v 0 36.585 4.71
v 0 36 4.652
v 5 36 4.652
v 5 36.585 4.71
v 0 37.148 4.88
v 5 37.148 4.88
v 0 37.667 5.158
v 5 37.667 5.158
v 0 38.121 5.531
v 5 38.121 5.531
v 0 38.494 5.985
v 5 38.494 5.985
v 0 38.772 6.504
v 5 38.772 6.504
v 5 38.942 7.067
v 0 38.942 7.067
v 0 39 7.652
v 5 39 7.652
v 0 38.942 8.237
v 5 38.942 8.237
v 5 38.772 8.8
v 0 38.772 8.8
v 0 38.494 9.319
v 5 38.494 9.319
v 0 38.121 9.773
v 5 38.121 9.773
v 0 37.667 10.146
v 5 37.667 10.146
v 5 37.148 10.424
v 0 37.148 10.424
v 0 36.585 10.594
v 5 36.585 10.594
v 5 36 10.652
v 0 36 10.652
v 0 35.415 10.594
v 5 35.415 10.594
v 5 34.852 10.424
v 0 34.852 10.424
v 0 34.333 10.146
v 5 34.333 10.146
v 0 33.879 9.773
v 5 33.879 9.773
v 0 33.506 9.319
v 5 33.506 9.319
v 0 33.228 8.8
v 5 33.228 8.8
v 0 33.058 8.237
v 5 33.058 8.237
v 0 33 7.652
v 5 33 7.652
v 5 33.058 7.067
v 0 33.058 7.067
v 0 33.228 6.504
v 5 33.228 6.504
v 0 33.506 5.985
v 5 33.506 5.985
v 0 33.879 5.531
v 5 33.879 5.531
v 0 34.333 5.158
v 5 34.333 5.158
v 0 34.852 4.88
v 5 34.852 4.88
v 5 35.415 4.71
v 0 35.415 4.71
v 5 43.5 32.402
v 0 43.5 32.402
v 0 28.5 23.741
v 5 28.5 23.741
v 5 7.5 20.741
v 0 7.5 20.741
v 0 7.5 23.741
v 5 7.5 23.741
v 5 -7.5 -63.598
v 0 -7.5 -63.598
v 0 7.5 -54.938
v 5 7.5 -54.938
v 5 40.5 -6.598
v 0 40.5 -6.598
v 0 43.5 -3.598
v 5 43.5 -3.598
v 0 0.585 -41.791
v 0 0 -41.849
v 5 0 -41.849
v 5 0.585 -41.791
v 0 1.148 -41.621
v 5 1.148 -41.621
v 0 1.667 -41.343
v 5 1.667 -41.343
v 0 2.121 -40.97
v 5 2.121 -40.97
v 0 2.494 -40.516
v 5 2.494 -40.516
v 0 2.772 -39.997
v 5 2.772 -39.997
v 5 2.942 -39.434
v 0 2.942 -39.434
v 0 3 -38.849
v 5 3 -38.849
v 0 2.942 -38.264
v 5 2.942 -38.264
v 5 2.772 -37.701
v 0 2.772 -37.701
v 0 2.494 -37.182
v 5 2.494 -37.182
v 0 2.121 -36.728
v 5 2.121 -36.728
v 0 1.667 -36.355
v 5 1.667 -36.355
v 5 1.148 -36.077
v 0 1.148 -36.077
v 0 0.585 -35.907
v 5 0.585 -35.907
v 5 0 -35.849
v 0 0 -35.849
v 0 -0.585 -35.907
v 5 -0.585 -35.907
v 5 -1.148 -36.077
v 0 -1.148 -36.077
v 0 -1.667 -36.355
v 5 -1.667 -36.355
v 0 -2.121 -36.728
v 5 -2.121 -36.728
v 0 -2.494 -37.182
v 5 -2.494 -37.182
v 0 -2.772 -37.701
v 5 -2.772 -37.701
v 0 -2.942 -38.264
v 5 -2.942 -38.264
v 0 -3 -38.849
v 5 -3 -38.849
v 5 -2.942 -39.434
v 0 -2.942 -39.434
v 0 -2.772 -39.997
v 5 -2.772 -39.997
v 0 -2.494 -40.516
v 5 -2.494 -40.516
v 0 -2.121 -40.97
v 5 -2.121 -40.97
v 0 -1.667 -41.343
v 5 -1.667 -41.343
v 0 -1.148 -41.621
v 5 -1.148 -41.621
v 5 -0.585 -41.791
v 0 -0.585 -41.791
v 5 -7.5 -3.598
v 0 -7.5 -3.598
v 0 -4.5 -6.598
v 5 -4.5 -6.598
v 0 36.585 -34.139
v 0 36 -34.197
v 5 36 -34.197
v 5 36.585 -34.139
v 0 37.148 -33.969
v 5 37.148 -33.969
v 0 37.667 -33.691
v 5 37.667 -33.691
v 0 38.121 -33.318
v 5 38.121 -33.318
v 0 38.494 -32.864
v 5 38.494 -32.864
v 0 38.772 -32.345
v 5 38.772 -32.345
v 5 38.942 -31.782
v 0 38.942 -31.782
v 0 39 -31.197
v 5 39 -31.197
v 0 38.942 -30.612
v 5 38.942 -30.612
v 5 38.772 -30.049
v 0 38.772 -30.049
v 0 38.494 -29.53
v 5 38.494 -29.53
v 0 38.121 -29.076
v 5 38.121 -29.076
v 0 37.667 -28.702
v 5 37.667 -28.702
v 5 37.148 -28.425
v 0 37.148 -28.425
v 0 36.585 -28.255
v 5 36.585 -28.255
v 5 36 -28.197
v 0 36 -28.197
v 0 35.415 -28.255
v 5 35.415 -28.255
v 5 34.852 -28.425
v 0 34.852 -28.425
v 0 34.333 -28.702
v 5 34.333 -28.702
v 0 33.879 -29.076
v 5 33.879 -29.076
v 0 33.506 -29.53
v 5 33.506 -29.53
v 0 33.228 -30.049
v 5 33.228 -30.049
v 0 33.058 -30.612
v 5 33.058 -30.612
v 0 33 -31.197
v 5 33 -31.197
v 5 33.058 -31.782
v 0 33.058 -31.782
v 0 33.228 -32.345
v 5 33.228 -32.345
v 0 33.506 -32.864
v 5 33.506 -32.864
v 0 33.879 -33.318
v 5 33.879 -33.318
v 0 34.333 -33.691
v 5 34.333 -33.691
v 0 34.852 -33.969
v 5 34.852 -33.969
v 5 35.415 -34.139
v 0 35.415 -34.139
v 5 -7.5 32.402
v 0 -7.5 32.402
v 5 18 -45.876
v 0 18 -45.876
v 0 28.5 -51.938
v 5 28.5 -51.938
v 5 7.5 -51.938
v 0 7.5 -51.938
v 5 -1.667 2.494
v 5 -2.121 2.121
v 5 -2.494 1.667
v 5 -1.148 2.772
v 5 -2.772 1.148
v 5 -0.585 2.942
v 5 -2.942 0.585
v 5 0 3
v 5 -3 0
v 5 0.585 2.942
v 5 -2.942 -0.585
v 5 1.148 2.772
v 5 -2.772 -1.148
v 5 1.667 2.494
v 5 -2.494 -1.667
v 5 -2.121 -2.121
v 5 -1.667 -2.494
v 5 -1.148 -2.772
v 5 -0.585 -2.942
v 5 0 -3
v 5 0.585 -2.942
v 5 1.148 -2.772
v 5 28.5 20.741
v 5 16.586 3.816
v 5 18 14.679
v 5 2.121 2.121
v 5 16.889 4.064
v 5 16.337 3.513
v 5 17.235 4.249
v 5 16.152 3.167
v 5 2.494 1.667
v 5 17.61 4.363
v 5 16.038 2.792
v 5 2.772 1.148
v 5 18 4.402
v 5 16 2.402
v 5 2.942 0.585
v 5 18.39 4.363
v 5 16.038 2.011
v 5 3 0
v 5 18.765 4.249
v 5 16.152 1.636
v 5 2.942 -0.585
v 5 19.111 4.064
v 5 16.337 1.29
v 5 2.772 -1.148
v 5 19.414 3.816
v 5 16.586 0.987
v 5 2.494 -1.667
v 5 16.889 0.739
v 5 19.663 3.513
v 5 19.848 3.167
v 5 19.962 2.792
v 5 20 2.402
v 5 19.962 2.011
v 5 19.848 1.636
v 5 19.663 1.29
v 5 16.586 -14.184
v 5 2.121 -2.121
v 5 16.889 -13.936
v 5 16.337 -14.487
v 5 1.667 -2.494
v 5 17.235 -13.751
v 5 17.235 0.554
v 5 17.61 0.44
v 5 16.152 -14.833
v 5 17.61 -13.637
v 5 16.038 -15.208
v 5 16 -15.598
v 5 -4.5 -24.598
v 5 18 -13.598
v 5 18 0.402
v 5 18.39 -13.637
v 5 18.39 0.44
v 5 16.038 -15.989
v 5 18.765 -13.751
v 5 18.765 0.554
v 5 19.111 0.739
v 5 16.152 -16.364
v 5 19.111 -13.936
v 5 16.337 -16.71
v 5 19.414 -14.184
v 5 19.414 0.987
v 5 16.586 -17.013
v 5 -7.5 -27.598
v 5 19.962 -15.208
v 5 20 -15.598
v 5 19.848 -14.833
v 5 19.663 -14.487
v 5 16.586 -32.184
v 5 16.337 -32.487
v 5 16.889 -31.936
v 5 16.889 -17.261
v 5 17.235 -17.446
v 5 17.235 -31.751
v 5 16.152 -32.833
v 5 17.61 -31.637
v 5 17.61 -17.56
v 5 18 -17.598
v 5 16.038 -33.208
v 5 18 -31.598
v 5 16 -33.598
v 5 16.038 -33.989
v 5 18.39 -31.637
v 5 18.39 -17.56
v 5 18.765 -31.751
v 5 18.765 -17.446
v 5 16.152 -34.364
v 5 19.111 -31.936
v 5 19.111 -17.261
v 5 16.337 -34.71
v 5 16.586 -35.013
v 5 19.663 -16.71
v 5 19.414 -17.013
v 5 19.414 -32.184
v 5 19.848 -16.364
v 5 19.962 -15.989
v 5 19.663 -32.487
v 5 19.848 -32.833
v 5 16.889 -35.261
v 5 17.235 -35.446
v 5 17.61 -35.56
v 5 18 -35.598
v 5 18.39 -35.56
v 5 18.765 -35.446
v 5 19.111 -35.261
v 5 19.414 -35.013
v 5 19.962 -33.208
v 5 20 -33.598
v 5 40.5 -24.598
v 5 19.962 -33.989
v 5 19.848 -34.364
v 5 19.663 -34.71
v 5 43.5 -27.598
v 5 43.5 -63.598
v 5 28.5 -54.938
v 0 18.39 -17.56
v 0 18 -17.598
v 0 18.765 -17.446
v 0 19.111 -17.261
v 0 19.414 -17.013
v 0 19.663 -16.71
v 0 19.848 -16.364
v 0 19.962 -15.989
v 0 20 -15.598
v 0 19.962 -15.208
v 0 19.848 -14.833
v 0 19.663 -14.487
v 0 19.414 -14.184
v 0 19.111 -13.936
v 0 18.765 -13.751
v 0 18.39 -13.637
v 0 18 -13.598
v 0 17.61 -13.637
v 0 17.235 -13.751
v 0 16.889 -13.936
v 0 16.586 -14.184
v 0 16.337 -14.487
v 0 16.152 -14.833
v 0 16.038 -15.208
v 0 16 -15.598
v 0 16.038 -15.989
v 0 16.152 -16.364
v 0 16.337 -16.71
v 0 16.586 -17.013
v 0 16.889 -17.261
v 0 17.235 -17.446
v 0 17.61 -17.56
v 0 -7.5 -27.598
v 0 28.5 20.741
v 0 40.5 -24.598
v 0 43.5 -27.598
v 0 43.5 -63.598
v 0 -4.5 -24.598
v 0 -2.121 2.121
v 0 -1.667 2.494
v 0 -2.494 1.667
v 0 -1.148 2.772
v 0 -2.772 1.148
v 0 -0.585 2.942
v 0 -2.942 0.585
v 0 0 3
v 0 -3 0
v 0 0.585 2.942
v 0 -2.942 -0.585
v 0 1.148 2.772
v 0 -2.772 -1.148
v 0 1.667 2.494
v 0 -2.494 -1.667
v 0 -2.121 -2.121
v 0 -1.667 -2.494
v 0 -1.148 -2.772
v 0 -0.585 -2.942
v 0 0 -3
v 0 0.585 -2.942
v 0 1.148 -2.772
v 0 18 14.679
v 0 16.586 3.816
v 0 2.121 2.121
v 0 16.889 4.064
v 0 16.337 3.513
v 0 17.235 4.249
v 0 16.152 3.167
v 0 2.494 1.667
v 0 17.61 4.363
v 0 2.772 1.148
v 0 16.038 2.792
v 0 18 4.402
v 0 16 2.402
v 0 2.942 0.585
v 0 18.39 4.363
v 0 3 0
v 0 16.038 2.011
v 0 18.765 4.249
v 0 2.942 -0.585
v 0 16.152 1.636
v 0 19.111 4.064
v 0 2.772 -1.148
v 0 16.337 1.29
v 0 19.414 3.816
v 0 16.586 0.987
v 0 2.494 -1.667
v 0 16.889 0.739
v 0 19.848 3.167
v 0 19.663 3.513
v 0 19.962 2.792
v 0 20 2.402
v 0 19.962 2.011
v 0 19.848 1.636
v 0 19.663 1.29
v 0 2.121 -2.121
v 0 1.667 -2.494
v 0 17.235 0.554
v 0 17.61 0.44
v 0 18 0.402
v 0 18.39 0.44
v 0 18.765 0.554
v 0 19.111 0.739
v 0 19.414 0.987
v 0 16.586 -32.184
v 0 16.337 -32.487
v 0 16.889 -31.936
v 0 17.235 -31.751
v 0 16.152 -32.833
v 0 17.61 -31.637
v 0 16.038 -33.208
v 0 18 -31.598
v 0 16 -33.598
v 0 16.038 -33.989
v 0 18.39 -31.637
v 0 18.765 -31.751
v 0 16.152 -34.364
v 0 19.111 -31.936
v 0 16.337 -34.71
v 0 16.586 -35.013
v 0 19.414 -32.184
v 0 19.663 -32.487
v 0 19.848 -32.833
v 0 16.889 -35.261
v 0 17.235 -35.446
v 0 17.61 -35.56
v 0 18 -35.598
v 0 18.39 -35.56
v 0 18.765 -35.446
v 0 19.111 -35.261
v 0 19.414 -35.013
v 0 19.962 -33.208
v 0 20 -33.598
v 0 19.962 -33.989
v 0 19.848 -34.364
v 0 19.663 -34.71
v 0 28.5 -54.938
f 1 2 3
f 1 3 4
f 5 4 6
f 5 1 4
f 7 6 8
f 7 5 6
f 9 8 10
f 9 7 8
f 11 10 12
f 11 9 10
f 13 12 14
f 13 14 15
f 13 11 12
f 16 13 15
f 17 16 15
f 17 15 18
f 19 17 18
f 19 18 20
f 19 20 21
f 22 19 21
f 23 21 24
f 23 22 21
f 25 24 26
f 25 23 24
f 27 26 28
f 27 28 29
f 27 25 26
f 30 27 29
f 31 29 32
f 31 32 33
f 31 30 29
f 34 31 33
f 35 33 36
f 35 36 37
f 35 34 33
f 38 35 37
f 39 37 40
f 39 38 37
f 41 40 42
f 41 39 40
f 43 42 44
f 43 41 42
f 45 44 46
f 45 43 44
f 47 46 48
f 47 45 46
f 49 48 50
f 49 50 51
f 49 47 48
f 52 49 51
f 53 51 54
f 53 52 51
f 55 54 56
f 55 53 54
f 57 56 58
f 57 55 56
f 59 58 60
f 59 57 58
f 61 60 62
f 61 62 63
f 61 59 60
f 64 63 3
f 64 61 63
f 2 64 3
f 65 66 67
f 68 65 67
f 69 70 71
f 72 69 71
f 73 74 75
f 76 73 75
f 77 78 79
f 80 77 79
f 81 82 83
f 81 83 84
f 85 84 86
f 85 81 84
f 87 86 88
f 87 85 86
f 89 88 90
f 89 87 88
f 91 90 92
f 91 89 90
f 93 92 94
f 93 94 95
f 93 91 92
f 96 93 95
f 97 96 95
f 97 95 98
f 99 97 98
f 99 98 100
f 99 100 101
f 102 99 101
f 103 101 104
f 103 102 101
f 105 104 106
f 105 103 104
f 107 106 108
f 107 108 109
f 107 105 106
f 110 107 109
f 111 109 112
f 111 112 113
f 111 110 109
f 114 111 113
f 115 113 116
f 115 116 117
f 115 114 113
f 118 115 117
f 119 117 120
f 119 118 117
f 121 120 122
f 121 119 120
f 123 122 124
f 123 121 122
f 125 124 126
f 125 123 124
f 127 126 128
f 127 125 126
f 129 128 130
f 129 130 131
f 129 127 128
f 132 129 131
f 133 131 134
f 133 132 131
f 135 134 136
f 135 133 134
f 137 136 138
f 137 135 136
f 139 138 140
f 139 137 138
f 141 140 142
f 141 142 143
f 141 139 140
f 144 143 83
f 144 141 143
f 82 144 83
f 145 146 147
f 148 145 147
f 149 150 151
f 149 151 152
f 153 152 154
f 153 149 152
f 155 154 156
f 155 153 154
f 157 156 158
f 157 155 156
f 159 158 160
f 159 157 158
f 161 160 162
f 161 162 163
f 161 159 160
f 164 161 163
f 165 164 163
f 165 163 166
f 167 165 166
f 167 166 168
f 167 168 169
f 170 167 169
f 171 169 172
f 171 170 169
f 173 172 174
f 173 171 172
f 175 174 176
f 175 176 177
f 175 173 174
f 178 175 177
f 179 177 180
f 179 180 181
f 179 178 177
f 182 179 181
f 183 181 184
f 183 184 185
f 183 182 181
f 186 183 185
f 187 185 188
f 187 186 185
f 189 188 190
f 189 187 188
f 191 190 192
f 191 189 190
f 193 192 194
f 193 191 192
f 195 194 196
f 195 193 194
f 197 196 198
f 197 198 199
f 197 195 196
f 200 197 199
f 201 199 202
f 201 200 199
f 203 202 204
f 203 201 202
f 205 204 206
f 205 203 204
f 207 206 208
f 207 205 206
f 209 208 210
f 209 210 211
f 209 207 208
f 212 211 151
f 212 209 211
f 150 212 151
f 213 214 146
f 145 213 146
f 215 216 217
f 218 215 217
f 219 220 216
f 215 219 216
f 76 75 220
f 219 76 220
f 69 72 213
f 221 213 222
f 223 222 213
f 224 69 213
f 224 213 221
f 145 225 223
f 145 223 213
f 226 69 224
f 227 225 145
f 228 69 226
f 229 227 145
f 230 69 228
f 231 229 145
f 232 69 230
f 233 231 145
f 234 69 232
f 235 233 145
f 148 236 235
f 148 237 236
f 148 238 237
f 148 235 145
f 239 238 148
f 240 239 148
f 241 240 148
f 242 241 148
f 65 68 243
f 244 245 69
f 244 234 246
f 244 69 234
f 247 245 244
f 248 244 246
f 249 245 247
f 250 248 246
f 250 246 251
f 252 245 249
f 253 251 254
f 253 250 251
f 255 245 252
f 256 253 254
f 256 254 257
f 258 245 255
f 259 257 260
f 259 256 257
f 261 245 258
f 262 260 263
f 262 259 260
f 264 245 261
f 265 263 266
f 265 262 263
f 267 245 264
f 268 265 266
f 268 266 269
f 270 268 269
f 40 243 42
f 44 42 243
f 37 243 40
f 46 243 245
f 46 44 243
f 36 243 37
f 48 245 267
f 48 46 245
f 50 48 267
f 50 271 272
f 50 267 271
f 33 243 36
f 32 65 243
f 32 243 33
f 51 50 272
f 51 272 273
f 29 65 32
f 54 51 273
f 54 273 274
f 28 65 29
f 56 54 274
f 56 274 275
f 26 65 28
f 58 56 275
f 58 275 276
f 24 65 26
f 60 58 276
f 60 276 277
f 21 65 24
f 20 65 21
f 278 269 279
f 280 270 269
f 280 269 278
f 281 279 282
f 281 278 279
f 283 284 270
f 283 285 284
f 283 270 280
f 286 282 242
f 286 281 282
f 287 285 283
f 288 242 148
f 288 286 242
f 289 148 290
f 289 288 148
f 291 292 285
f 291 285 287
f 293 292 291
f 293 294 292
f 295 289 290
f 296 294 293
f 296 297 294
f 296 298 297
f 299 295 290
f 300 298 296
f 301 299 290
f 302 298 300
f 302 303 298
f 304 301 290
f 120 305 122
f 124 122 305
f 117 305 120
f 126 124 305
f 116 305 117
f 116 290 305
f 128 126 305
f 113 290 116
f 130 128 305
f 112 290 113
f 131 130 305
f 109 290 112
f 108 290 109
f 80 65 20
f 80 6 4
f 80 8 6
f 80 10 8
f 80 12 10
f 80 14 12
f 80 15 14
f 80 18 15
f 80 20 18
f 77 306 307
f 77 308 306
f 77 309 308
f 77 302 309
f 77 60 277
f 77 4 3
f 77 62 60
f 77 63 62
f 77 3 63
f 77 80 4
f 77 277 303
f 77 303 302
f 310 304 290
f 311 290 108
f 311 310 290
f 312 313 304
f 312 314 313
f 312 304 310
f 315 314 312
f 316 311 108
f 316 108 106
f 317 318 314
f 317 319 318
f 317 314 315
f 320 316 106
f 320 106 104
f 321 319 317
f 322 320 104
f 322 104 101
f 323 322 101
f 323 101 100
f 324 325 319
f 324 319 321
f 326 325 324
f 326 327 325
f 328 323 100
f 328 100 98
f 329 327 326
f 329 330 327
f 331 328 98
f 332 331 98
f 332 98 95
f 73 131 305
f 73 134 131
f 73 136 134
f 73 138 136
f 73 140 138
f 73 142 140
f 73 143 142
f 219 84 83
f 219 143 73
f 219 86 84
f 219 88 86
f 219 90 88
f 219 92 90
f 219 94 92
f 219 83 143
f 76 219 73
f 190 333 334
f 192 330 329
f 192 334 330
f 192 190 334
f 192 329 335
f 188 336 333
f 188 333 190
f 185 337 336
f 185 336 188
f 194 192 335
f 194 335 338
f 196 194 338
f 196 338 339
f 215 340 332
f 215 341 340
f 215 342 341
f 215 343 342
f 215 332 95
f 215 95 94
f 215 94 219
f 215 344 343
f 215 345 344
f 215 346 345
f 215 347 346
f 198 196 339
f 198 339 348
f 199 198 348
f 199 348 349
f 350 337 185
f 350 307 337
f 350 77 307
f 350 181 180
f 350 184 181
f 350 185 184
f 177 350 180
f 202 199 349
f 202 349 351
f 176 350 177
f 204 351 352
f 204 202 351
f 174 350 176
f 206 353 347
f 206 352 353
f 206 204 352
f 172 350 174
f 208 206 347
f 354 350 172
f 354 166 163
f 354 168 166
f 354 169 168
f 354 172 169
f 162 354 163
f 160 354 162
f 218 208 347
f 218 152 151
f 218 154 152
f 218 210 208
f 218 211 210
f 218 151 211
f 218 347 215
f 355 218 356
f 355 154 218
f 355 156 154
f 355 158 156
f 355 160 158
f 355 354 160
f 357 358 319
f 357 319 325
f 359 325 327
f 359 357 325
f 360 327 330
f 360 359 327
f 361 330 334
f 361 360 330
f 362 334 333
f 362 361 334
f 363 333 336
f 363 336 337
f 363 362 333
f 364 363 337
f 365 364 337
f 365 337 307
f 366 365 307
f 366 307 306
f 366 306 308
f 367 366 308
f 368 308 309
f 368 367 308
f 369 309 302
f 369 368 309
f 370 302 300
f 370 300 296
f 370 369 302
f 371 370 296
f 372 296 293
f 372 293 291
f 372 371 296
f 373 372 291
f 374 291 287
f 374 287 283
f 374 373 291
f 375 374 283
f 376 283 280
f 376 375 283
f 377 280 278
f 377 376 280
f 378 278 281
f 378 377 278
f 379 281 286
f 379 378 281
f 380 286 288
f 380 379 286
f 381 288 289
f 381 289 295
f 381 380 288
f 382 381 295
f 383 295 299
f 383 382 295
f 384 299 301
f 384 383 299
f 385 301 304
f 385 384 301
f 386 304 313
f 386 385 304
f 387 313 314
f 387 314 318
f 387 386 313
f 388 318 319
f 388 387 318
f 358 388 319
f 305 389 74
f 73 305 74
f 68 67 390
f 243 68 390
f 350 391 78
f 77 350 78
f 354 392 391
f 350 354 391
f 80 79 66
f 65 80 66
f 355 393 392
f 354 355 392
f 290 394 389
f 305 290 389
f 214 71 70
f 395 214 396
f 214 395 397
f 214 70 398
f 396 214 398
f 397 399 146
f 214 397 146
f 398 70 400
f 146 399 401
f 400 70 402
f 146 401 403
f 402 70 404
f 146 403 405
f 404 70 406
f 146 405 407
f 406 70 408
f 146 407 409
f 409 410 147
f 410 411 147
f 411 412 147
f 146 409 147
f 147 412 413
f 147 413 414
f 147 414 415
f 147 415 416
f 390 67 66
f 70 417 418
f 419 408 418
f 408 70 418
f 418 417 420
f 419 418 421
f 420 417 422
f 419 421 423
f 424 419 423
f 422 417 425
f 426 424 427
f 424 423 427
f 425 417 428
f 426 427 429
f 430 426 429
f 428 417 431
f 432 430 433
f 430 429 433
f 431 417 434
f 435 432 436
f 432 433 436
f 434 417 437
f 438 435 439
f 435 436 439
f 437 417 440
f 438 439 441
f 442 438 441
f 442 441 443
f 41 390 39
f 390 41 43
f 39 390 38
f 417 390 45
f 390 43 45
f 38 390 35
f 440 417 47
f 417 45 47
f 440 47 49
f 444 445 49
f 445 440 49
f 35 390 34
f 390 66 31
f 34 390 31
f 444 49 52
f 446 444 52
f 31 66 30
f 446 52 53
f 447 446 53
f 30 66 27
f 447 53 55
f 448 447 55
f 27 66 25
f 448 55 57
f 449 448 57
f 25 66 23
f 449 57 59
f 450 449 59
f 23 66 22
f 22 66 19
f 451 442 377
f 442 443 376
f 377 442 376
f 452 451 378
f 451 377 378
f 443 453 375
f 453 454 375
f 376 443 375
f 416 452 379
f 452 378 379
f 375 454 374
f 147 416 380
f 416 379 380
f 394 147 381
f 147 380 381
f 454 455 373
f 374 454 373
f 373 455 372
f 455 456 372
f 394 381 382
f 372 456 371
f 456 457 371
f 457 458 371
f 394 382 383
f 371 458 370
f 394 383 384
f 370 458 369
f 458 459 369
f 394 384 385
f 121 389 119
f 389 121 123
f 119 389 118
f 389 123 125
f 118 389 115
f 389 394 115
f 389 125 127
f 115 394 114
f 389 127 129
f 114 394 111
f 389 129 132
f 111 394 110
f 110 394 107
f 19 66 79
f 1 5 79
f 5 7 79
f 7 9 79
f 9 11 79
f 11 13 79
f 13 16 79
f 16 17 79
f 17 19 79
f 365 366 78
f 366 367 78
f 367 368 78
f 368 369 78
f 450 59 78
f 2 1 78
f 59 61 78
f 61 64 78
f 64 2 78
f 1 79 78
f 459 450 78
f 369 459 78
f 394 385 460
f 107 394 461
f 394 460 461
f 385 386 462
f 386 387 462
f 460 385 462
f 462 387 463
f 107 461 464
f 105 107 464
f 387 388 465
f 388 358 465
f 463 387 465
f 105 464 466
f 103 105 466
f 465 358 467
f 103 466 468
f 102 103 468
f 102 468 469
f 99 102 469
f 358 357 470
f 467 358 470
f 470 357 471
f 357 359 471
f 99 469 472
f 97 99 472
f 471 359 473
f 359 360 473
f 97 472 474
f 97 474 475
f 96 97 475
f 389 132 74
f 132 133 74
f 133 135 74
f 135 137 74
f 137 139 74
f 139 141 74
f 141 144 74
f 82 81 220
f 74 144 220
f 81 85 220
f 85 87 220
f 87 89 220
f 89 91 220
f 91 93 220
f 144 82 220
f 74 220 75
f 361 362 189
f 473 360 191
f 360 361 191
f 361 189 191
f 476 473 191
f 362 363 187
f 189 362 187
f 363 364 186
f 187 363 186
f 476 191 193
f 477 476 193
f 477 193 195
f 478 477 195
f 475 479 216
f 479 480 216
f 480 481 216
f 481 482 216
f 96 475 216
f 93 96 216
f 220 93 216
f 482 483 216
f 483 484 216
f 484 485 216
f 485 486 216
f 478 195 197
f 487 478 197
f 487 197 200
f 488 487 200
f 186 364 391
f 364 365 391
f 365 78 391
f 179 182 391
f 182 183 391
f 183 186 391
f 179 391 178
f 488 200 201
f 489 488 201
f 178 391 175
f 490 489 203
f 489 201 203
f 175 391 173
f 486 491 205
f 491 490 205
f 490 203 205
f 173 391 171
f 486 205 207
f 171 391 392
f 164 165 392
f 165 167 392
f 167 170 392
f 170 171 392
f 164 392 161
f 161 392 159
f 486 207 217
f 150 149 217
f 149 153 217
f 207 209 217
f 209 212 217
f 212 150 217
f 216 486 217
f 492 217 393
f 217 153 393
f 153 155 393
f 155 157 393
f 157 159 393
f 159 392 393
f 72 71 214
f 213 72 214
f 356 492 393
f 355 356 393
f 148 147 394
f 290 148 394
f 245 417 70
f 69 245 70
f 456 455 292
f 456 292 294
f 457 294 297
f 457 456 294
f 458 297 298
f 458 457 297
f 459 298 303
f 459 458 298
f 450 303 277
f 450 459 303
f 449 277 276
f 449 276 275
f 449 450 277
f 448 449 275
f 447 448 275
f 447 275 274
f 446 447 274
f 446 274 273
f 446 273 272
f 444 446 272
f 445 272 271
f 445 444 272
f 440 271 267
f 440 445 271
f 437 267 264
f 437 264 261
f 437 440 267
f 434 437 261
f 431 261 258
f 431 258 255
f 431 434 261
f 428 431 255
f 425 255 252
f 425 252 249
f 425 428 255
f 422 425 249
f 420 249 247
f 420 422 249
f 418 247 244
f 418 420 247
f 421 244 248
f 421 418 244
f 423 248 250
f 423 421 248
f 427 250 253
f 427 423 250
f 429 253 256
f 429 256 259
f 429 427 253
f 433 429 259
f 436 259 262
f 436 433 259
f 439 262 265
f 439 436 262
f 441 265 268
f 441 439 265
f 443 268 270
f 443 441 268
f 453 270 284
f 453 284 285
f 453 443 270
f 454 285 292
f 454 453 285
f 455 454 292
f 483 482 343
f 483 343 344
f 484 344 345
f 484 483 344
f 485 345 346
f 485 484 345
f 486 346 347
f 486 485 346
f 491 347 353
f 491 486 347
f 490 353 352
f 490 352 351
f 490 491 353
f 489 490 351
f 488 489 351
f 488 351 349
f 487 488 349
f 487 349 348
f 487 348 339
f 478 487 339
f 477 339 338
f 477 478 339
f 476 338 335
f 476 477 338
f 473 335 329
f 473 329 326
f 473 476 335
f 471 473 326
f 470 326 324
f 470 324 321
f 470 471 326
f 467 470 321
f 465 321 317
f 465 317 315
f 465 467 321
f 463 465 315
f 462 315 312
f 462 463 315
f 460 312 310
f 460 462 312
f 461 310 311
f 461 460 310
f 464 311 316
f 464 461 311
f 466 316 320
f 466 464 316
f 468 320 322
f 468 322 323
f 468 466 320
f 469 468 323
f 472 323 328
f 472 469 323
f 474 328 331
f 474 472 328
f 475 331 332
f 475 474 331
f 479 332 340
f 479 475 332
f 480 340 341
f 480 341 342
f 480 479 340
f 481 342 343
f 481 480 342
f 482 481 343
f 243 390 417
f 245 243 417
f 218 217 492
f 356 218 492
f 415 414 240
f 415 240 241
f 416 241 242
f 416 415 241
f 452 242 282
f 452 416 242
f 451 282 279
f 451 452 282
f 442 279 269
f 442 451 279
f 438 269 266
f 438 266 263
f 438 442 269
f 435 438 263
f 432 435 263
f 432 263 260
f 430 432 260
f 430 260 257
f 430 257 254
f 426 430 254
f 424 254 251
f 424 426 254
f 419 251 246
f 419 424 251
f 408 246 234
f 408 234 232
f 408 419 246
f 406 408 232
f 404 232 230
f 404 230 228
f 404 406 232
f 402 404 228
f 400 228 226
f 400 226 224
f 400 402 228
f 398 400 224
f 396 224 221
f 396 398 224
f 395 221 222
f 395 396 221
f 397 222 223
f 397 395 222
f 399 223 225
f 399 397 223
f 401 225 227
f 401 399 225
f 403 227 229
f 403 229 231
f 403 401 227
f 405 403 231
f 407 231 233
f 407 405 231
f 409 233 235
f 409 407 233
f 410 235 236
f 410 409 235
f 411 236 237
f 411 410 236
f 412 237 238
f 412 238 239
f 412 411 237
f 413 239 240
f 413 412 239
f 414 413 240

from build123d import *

# Parameters (mm, degrees)
SKETCH1_R           = 3
SKETCH1_R_2         = 2
BOSS_EXTRUDE1_DEPTH = 5


with BuildPart() as part:
    # Sketch1 → Boss-Extrude1 (new body)
    with BuildSketch(Plane(origin=(0, 0, 0), x_dir=(0, 0, -1), z_dir=(1, 0, 0))):
        Polygon((-32.401546808, -7.5), (3.598453192, -7.5), (6.598453192, -4.5), (24.598453192, -4.5), (27.598453192, -7.5), (63.598453192, -7.5), (54.938199155, 7.5), (51.938199155, 7.5), (45.876021328, 18), (51.938199155, 28.5), (54.938199155, 28.5), (63.598453192, 43.5), (27.598453192, 43.5), (24.598453192, 40.5), (6.598453192, 40.5), (3.598453192, 43.5), (-32.401546808, 43.5), (-23.74129277, 28.5), (-20.74129277, 28.5), (-14.679114943, 18), (-20.74129277, 7.5), (-23.74129277, 7.5), align=None)
        Circle(SKETCH1_R, mode=Mode.SUBTRACT)
        with Locations((38.848942605, 0)):
            Circle(SKETCH1_R, mode=Mode.SUBTRACT)
        with Locations((31.196906385, 36)):
            Circle(SKETCH1_R, mode=Mode.SUBTRACT)
        with Locations((-7.65203622, 36)):
            Circle(SKETCH1_R, mode=Mode.SUBTRACT)
        with Locations((15.598453192, 18)):
            Circle(SKETCH1_R_2, mode=Mode.SUBTRACT)
        with Locations((-2.401546808, 18)):
            Circle(SKETCH1_R_2, mode=Mode.SUBTRACT)
        with Locations((33.598453192, 18)):
            Circle(SKETCH1_R_2, mode=Mode.SUBTRACT)
    extrude(amount=BOSS_EXTRUDE1_DEPTH)


solid = part.part
